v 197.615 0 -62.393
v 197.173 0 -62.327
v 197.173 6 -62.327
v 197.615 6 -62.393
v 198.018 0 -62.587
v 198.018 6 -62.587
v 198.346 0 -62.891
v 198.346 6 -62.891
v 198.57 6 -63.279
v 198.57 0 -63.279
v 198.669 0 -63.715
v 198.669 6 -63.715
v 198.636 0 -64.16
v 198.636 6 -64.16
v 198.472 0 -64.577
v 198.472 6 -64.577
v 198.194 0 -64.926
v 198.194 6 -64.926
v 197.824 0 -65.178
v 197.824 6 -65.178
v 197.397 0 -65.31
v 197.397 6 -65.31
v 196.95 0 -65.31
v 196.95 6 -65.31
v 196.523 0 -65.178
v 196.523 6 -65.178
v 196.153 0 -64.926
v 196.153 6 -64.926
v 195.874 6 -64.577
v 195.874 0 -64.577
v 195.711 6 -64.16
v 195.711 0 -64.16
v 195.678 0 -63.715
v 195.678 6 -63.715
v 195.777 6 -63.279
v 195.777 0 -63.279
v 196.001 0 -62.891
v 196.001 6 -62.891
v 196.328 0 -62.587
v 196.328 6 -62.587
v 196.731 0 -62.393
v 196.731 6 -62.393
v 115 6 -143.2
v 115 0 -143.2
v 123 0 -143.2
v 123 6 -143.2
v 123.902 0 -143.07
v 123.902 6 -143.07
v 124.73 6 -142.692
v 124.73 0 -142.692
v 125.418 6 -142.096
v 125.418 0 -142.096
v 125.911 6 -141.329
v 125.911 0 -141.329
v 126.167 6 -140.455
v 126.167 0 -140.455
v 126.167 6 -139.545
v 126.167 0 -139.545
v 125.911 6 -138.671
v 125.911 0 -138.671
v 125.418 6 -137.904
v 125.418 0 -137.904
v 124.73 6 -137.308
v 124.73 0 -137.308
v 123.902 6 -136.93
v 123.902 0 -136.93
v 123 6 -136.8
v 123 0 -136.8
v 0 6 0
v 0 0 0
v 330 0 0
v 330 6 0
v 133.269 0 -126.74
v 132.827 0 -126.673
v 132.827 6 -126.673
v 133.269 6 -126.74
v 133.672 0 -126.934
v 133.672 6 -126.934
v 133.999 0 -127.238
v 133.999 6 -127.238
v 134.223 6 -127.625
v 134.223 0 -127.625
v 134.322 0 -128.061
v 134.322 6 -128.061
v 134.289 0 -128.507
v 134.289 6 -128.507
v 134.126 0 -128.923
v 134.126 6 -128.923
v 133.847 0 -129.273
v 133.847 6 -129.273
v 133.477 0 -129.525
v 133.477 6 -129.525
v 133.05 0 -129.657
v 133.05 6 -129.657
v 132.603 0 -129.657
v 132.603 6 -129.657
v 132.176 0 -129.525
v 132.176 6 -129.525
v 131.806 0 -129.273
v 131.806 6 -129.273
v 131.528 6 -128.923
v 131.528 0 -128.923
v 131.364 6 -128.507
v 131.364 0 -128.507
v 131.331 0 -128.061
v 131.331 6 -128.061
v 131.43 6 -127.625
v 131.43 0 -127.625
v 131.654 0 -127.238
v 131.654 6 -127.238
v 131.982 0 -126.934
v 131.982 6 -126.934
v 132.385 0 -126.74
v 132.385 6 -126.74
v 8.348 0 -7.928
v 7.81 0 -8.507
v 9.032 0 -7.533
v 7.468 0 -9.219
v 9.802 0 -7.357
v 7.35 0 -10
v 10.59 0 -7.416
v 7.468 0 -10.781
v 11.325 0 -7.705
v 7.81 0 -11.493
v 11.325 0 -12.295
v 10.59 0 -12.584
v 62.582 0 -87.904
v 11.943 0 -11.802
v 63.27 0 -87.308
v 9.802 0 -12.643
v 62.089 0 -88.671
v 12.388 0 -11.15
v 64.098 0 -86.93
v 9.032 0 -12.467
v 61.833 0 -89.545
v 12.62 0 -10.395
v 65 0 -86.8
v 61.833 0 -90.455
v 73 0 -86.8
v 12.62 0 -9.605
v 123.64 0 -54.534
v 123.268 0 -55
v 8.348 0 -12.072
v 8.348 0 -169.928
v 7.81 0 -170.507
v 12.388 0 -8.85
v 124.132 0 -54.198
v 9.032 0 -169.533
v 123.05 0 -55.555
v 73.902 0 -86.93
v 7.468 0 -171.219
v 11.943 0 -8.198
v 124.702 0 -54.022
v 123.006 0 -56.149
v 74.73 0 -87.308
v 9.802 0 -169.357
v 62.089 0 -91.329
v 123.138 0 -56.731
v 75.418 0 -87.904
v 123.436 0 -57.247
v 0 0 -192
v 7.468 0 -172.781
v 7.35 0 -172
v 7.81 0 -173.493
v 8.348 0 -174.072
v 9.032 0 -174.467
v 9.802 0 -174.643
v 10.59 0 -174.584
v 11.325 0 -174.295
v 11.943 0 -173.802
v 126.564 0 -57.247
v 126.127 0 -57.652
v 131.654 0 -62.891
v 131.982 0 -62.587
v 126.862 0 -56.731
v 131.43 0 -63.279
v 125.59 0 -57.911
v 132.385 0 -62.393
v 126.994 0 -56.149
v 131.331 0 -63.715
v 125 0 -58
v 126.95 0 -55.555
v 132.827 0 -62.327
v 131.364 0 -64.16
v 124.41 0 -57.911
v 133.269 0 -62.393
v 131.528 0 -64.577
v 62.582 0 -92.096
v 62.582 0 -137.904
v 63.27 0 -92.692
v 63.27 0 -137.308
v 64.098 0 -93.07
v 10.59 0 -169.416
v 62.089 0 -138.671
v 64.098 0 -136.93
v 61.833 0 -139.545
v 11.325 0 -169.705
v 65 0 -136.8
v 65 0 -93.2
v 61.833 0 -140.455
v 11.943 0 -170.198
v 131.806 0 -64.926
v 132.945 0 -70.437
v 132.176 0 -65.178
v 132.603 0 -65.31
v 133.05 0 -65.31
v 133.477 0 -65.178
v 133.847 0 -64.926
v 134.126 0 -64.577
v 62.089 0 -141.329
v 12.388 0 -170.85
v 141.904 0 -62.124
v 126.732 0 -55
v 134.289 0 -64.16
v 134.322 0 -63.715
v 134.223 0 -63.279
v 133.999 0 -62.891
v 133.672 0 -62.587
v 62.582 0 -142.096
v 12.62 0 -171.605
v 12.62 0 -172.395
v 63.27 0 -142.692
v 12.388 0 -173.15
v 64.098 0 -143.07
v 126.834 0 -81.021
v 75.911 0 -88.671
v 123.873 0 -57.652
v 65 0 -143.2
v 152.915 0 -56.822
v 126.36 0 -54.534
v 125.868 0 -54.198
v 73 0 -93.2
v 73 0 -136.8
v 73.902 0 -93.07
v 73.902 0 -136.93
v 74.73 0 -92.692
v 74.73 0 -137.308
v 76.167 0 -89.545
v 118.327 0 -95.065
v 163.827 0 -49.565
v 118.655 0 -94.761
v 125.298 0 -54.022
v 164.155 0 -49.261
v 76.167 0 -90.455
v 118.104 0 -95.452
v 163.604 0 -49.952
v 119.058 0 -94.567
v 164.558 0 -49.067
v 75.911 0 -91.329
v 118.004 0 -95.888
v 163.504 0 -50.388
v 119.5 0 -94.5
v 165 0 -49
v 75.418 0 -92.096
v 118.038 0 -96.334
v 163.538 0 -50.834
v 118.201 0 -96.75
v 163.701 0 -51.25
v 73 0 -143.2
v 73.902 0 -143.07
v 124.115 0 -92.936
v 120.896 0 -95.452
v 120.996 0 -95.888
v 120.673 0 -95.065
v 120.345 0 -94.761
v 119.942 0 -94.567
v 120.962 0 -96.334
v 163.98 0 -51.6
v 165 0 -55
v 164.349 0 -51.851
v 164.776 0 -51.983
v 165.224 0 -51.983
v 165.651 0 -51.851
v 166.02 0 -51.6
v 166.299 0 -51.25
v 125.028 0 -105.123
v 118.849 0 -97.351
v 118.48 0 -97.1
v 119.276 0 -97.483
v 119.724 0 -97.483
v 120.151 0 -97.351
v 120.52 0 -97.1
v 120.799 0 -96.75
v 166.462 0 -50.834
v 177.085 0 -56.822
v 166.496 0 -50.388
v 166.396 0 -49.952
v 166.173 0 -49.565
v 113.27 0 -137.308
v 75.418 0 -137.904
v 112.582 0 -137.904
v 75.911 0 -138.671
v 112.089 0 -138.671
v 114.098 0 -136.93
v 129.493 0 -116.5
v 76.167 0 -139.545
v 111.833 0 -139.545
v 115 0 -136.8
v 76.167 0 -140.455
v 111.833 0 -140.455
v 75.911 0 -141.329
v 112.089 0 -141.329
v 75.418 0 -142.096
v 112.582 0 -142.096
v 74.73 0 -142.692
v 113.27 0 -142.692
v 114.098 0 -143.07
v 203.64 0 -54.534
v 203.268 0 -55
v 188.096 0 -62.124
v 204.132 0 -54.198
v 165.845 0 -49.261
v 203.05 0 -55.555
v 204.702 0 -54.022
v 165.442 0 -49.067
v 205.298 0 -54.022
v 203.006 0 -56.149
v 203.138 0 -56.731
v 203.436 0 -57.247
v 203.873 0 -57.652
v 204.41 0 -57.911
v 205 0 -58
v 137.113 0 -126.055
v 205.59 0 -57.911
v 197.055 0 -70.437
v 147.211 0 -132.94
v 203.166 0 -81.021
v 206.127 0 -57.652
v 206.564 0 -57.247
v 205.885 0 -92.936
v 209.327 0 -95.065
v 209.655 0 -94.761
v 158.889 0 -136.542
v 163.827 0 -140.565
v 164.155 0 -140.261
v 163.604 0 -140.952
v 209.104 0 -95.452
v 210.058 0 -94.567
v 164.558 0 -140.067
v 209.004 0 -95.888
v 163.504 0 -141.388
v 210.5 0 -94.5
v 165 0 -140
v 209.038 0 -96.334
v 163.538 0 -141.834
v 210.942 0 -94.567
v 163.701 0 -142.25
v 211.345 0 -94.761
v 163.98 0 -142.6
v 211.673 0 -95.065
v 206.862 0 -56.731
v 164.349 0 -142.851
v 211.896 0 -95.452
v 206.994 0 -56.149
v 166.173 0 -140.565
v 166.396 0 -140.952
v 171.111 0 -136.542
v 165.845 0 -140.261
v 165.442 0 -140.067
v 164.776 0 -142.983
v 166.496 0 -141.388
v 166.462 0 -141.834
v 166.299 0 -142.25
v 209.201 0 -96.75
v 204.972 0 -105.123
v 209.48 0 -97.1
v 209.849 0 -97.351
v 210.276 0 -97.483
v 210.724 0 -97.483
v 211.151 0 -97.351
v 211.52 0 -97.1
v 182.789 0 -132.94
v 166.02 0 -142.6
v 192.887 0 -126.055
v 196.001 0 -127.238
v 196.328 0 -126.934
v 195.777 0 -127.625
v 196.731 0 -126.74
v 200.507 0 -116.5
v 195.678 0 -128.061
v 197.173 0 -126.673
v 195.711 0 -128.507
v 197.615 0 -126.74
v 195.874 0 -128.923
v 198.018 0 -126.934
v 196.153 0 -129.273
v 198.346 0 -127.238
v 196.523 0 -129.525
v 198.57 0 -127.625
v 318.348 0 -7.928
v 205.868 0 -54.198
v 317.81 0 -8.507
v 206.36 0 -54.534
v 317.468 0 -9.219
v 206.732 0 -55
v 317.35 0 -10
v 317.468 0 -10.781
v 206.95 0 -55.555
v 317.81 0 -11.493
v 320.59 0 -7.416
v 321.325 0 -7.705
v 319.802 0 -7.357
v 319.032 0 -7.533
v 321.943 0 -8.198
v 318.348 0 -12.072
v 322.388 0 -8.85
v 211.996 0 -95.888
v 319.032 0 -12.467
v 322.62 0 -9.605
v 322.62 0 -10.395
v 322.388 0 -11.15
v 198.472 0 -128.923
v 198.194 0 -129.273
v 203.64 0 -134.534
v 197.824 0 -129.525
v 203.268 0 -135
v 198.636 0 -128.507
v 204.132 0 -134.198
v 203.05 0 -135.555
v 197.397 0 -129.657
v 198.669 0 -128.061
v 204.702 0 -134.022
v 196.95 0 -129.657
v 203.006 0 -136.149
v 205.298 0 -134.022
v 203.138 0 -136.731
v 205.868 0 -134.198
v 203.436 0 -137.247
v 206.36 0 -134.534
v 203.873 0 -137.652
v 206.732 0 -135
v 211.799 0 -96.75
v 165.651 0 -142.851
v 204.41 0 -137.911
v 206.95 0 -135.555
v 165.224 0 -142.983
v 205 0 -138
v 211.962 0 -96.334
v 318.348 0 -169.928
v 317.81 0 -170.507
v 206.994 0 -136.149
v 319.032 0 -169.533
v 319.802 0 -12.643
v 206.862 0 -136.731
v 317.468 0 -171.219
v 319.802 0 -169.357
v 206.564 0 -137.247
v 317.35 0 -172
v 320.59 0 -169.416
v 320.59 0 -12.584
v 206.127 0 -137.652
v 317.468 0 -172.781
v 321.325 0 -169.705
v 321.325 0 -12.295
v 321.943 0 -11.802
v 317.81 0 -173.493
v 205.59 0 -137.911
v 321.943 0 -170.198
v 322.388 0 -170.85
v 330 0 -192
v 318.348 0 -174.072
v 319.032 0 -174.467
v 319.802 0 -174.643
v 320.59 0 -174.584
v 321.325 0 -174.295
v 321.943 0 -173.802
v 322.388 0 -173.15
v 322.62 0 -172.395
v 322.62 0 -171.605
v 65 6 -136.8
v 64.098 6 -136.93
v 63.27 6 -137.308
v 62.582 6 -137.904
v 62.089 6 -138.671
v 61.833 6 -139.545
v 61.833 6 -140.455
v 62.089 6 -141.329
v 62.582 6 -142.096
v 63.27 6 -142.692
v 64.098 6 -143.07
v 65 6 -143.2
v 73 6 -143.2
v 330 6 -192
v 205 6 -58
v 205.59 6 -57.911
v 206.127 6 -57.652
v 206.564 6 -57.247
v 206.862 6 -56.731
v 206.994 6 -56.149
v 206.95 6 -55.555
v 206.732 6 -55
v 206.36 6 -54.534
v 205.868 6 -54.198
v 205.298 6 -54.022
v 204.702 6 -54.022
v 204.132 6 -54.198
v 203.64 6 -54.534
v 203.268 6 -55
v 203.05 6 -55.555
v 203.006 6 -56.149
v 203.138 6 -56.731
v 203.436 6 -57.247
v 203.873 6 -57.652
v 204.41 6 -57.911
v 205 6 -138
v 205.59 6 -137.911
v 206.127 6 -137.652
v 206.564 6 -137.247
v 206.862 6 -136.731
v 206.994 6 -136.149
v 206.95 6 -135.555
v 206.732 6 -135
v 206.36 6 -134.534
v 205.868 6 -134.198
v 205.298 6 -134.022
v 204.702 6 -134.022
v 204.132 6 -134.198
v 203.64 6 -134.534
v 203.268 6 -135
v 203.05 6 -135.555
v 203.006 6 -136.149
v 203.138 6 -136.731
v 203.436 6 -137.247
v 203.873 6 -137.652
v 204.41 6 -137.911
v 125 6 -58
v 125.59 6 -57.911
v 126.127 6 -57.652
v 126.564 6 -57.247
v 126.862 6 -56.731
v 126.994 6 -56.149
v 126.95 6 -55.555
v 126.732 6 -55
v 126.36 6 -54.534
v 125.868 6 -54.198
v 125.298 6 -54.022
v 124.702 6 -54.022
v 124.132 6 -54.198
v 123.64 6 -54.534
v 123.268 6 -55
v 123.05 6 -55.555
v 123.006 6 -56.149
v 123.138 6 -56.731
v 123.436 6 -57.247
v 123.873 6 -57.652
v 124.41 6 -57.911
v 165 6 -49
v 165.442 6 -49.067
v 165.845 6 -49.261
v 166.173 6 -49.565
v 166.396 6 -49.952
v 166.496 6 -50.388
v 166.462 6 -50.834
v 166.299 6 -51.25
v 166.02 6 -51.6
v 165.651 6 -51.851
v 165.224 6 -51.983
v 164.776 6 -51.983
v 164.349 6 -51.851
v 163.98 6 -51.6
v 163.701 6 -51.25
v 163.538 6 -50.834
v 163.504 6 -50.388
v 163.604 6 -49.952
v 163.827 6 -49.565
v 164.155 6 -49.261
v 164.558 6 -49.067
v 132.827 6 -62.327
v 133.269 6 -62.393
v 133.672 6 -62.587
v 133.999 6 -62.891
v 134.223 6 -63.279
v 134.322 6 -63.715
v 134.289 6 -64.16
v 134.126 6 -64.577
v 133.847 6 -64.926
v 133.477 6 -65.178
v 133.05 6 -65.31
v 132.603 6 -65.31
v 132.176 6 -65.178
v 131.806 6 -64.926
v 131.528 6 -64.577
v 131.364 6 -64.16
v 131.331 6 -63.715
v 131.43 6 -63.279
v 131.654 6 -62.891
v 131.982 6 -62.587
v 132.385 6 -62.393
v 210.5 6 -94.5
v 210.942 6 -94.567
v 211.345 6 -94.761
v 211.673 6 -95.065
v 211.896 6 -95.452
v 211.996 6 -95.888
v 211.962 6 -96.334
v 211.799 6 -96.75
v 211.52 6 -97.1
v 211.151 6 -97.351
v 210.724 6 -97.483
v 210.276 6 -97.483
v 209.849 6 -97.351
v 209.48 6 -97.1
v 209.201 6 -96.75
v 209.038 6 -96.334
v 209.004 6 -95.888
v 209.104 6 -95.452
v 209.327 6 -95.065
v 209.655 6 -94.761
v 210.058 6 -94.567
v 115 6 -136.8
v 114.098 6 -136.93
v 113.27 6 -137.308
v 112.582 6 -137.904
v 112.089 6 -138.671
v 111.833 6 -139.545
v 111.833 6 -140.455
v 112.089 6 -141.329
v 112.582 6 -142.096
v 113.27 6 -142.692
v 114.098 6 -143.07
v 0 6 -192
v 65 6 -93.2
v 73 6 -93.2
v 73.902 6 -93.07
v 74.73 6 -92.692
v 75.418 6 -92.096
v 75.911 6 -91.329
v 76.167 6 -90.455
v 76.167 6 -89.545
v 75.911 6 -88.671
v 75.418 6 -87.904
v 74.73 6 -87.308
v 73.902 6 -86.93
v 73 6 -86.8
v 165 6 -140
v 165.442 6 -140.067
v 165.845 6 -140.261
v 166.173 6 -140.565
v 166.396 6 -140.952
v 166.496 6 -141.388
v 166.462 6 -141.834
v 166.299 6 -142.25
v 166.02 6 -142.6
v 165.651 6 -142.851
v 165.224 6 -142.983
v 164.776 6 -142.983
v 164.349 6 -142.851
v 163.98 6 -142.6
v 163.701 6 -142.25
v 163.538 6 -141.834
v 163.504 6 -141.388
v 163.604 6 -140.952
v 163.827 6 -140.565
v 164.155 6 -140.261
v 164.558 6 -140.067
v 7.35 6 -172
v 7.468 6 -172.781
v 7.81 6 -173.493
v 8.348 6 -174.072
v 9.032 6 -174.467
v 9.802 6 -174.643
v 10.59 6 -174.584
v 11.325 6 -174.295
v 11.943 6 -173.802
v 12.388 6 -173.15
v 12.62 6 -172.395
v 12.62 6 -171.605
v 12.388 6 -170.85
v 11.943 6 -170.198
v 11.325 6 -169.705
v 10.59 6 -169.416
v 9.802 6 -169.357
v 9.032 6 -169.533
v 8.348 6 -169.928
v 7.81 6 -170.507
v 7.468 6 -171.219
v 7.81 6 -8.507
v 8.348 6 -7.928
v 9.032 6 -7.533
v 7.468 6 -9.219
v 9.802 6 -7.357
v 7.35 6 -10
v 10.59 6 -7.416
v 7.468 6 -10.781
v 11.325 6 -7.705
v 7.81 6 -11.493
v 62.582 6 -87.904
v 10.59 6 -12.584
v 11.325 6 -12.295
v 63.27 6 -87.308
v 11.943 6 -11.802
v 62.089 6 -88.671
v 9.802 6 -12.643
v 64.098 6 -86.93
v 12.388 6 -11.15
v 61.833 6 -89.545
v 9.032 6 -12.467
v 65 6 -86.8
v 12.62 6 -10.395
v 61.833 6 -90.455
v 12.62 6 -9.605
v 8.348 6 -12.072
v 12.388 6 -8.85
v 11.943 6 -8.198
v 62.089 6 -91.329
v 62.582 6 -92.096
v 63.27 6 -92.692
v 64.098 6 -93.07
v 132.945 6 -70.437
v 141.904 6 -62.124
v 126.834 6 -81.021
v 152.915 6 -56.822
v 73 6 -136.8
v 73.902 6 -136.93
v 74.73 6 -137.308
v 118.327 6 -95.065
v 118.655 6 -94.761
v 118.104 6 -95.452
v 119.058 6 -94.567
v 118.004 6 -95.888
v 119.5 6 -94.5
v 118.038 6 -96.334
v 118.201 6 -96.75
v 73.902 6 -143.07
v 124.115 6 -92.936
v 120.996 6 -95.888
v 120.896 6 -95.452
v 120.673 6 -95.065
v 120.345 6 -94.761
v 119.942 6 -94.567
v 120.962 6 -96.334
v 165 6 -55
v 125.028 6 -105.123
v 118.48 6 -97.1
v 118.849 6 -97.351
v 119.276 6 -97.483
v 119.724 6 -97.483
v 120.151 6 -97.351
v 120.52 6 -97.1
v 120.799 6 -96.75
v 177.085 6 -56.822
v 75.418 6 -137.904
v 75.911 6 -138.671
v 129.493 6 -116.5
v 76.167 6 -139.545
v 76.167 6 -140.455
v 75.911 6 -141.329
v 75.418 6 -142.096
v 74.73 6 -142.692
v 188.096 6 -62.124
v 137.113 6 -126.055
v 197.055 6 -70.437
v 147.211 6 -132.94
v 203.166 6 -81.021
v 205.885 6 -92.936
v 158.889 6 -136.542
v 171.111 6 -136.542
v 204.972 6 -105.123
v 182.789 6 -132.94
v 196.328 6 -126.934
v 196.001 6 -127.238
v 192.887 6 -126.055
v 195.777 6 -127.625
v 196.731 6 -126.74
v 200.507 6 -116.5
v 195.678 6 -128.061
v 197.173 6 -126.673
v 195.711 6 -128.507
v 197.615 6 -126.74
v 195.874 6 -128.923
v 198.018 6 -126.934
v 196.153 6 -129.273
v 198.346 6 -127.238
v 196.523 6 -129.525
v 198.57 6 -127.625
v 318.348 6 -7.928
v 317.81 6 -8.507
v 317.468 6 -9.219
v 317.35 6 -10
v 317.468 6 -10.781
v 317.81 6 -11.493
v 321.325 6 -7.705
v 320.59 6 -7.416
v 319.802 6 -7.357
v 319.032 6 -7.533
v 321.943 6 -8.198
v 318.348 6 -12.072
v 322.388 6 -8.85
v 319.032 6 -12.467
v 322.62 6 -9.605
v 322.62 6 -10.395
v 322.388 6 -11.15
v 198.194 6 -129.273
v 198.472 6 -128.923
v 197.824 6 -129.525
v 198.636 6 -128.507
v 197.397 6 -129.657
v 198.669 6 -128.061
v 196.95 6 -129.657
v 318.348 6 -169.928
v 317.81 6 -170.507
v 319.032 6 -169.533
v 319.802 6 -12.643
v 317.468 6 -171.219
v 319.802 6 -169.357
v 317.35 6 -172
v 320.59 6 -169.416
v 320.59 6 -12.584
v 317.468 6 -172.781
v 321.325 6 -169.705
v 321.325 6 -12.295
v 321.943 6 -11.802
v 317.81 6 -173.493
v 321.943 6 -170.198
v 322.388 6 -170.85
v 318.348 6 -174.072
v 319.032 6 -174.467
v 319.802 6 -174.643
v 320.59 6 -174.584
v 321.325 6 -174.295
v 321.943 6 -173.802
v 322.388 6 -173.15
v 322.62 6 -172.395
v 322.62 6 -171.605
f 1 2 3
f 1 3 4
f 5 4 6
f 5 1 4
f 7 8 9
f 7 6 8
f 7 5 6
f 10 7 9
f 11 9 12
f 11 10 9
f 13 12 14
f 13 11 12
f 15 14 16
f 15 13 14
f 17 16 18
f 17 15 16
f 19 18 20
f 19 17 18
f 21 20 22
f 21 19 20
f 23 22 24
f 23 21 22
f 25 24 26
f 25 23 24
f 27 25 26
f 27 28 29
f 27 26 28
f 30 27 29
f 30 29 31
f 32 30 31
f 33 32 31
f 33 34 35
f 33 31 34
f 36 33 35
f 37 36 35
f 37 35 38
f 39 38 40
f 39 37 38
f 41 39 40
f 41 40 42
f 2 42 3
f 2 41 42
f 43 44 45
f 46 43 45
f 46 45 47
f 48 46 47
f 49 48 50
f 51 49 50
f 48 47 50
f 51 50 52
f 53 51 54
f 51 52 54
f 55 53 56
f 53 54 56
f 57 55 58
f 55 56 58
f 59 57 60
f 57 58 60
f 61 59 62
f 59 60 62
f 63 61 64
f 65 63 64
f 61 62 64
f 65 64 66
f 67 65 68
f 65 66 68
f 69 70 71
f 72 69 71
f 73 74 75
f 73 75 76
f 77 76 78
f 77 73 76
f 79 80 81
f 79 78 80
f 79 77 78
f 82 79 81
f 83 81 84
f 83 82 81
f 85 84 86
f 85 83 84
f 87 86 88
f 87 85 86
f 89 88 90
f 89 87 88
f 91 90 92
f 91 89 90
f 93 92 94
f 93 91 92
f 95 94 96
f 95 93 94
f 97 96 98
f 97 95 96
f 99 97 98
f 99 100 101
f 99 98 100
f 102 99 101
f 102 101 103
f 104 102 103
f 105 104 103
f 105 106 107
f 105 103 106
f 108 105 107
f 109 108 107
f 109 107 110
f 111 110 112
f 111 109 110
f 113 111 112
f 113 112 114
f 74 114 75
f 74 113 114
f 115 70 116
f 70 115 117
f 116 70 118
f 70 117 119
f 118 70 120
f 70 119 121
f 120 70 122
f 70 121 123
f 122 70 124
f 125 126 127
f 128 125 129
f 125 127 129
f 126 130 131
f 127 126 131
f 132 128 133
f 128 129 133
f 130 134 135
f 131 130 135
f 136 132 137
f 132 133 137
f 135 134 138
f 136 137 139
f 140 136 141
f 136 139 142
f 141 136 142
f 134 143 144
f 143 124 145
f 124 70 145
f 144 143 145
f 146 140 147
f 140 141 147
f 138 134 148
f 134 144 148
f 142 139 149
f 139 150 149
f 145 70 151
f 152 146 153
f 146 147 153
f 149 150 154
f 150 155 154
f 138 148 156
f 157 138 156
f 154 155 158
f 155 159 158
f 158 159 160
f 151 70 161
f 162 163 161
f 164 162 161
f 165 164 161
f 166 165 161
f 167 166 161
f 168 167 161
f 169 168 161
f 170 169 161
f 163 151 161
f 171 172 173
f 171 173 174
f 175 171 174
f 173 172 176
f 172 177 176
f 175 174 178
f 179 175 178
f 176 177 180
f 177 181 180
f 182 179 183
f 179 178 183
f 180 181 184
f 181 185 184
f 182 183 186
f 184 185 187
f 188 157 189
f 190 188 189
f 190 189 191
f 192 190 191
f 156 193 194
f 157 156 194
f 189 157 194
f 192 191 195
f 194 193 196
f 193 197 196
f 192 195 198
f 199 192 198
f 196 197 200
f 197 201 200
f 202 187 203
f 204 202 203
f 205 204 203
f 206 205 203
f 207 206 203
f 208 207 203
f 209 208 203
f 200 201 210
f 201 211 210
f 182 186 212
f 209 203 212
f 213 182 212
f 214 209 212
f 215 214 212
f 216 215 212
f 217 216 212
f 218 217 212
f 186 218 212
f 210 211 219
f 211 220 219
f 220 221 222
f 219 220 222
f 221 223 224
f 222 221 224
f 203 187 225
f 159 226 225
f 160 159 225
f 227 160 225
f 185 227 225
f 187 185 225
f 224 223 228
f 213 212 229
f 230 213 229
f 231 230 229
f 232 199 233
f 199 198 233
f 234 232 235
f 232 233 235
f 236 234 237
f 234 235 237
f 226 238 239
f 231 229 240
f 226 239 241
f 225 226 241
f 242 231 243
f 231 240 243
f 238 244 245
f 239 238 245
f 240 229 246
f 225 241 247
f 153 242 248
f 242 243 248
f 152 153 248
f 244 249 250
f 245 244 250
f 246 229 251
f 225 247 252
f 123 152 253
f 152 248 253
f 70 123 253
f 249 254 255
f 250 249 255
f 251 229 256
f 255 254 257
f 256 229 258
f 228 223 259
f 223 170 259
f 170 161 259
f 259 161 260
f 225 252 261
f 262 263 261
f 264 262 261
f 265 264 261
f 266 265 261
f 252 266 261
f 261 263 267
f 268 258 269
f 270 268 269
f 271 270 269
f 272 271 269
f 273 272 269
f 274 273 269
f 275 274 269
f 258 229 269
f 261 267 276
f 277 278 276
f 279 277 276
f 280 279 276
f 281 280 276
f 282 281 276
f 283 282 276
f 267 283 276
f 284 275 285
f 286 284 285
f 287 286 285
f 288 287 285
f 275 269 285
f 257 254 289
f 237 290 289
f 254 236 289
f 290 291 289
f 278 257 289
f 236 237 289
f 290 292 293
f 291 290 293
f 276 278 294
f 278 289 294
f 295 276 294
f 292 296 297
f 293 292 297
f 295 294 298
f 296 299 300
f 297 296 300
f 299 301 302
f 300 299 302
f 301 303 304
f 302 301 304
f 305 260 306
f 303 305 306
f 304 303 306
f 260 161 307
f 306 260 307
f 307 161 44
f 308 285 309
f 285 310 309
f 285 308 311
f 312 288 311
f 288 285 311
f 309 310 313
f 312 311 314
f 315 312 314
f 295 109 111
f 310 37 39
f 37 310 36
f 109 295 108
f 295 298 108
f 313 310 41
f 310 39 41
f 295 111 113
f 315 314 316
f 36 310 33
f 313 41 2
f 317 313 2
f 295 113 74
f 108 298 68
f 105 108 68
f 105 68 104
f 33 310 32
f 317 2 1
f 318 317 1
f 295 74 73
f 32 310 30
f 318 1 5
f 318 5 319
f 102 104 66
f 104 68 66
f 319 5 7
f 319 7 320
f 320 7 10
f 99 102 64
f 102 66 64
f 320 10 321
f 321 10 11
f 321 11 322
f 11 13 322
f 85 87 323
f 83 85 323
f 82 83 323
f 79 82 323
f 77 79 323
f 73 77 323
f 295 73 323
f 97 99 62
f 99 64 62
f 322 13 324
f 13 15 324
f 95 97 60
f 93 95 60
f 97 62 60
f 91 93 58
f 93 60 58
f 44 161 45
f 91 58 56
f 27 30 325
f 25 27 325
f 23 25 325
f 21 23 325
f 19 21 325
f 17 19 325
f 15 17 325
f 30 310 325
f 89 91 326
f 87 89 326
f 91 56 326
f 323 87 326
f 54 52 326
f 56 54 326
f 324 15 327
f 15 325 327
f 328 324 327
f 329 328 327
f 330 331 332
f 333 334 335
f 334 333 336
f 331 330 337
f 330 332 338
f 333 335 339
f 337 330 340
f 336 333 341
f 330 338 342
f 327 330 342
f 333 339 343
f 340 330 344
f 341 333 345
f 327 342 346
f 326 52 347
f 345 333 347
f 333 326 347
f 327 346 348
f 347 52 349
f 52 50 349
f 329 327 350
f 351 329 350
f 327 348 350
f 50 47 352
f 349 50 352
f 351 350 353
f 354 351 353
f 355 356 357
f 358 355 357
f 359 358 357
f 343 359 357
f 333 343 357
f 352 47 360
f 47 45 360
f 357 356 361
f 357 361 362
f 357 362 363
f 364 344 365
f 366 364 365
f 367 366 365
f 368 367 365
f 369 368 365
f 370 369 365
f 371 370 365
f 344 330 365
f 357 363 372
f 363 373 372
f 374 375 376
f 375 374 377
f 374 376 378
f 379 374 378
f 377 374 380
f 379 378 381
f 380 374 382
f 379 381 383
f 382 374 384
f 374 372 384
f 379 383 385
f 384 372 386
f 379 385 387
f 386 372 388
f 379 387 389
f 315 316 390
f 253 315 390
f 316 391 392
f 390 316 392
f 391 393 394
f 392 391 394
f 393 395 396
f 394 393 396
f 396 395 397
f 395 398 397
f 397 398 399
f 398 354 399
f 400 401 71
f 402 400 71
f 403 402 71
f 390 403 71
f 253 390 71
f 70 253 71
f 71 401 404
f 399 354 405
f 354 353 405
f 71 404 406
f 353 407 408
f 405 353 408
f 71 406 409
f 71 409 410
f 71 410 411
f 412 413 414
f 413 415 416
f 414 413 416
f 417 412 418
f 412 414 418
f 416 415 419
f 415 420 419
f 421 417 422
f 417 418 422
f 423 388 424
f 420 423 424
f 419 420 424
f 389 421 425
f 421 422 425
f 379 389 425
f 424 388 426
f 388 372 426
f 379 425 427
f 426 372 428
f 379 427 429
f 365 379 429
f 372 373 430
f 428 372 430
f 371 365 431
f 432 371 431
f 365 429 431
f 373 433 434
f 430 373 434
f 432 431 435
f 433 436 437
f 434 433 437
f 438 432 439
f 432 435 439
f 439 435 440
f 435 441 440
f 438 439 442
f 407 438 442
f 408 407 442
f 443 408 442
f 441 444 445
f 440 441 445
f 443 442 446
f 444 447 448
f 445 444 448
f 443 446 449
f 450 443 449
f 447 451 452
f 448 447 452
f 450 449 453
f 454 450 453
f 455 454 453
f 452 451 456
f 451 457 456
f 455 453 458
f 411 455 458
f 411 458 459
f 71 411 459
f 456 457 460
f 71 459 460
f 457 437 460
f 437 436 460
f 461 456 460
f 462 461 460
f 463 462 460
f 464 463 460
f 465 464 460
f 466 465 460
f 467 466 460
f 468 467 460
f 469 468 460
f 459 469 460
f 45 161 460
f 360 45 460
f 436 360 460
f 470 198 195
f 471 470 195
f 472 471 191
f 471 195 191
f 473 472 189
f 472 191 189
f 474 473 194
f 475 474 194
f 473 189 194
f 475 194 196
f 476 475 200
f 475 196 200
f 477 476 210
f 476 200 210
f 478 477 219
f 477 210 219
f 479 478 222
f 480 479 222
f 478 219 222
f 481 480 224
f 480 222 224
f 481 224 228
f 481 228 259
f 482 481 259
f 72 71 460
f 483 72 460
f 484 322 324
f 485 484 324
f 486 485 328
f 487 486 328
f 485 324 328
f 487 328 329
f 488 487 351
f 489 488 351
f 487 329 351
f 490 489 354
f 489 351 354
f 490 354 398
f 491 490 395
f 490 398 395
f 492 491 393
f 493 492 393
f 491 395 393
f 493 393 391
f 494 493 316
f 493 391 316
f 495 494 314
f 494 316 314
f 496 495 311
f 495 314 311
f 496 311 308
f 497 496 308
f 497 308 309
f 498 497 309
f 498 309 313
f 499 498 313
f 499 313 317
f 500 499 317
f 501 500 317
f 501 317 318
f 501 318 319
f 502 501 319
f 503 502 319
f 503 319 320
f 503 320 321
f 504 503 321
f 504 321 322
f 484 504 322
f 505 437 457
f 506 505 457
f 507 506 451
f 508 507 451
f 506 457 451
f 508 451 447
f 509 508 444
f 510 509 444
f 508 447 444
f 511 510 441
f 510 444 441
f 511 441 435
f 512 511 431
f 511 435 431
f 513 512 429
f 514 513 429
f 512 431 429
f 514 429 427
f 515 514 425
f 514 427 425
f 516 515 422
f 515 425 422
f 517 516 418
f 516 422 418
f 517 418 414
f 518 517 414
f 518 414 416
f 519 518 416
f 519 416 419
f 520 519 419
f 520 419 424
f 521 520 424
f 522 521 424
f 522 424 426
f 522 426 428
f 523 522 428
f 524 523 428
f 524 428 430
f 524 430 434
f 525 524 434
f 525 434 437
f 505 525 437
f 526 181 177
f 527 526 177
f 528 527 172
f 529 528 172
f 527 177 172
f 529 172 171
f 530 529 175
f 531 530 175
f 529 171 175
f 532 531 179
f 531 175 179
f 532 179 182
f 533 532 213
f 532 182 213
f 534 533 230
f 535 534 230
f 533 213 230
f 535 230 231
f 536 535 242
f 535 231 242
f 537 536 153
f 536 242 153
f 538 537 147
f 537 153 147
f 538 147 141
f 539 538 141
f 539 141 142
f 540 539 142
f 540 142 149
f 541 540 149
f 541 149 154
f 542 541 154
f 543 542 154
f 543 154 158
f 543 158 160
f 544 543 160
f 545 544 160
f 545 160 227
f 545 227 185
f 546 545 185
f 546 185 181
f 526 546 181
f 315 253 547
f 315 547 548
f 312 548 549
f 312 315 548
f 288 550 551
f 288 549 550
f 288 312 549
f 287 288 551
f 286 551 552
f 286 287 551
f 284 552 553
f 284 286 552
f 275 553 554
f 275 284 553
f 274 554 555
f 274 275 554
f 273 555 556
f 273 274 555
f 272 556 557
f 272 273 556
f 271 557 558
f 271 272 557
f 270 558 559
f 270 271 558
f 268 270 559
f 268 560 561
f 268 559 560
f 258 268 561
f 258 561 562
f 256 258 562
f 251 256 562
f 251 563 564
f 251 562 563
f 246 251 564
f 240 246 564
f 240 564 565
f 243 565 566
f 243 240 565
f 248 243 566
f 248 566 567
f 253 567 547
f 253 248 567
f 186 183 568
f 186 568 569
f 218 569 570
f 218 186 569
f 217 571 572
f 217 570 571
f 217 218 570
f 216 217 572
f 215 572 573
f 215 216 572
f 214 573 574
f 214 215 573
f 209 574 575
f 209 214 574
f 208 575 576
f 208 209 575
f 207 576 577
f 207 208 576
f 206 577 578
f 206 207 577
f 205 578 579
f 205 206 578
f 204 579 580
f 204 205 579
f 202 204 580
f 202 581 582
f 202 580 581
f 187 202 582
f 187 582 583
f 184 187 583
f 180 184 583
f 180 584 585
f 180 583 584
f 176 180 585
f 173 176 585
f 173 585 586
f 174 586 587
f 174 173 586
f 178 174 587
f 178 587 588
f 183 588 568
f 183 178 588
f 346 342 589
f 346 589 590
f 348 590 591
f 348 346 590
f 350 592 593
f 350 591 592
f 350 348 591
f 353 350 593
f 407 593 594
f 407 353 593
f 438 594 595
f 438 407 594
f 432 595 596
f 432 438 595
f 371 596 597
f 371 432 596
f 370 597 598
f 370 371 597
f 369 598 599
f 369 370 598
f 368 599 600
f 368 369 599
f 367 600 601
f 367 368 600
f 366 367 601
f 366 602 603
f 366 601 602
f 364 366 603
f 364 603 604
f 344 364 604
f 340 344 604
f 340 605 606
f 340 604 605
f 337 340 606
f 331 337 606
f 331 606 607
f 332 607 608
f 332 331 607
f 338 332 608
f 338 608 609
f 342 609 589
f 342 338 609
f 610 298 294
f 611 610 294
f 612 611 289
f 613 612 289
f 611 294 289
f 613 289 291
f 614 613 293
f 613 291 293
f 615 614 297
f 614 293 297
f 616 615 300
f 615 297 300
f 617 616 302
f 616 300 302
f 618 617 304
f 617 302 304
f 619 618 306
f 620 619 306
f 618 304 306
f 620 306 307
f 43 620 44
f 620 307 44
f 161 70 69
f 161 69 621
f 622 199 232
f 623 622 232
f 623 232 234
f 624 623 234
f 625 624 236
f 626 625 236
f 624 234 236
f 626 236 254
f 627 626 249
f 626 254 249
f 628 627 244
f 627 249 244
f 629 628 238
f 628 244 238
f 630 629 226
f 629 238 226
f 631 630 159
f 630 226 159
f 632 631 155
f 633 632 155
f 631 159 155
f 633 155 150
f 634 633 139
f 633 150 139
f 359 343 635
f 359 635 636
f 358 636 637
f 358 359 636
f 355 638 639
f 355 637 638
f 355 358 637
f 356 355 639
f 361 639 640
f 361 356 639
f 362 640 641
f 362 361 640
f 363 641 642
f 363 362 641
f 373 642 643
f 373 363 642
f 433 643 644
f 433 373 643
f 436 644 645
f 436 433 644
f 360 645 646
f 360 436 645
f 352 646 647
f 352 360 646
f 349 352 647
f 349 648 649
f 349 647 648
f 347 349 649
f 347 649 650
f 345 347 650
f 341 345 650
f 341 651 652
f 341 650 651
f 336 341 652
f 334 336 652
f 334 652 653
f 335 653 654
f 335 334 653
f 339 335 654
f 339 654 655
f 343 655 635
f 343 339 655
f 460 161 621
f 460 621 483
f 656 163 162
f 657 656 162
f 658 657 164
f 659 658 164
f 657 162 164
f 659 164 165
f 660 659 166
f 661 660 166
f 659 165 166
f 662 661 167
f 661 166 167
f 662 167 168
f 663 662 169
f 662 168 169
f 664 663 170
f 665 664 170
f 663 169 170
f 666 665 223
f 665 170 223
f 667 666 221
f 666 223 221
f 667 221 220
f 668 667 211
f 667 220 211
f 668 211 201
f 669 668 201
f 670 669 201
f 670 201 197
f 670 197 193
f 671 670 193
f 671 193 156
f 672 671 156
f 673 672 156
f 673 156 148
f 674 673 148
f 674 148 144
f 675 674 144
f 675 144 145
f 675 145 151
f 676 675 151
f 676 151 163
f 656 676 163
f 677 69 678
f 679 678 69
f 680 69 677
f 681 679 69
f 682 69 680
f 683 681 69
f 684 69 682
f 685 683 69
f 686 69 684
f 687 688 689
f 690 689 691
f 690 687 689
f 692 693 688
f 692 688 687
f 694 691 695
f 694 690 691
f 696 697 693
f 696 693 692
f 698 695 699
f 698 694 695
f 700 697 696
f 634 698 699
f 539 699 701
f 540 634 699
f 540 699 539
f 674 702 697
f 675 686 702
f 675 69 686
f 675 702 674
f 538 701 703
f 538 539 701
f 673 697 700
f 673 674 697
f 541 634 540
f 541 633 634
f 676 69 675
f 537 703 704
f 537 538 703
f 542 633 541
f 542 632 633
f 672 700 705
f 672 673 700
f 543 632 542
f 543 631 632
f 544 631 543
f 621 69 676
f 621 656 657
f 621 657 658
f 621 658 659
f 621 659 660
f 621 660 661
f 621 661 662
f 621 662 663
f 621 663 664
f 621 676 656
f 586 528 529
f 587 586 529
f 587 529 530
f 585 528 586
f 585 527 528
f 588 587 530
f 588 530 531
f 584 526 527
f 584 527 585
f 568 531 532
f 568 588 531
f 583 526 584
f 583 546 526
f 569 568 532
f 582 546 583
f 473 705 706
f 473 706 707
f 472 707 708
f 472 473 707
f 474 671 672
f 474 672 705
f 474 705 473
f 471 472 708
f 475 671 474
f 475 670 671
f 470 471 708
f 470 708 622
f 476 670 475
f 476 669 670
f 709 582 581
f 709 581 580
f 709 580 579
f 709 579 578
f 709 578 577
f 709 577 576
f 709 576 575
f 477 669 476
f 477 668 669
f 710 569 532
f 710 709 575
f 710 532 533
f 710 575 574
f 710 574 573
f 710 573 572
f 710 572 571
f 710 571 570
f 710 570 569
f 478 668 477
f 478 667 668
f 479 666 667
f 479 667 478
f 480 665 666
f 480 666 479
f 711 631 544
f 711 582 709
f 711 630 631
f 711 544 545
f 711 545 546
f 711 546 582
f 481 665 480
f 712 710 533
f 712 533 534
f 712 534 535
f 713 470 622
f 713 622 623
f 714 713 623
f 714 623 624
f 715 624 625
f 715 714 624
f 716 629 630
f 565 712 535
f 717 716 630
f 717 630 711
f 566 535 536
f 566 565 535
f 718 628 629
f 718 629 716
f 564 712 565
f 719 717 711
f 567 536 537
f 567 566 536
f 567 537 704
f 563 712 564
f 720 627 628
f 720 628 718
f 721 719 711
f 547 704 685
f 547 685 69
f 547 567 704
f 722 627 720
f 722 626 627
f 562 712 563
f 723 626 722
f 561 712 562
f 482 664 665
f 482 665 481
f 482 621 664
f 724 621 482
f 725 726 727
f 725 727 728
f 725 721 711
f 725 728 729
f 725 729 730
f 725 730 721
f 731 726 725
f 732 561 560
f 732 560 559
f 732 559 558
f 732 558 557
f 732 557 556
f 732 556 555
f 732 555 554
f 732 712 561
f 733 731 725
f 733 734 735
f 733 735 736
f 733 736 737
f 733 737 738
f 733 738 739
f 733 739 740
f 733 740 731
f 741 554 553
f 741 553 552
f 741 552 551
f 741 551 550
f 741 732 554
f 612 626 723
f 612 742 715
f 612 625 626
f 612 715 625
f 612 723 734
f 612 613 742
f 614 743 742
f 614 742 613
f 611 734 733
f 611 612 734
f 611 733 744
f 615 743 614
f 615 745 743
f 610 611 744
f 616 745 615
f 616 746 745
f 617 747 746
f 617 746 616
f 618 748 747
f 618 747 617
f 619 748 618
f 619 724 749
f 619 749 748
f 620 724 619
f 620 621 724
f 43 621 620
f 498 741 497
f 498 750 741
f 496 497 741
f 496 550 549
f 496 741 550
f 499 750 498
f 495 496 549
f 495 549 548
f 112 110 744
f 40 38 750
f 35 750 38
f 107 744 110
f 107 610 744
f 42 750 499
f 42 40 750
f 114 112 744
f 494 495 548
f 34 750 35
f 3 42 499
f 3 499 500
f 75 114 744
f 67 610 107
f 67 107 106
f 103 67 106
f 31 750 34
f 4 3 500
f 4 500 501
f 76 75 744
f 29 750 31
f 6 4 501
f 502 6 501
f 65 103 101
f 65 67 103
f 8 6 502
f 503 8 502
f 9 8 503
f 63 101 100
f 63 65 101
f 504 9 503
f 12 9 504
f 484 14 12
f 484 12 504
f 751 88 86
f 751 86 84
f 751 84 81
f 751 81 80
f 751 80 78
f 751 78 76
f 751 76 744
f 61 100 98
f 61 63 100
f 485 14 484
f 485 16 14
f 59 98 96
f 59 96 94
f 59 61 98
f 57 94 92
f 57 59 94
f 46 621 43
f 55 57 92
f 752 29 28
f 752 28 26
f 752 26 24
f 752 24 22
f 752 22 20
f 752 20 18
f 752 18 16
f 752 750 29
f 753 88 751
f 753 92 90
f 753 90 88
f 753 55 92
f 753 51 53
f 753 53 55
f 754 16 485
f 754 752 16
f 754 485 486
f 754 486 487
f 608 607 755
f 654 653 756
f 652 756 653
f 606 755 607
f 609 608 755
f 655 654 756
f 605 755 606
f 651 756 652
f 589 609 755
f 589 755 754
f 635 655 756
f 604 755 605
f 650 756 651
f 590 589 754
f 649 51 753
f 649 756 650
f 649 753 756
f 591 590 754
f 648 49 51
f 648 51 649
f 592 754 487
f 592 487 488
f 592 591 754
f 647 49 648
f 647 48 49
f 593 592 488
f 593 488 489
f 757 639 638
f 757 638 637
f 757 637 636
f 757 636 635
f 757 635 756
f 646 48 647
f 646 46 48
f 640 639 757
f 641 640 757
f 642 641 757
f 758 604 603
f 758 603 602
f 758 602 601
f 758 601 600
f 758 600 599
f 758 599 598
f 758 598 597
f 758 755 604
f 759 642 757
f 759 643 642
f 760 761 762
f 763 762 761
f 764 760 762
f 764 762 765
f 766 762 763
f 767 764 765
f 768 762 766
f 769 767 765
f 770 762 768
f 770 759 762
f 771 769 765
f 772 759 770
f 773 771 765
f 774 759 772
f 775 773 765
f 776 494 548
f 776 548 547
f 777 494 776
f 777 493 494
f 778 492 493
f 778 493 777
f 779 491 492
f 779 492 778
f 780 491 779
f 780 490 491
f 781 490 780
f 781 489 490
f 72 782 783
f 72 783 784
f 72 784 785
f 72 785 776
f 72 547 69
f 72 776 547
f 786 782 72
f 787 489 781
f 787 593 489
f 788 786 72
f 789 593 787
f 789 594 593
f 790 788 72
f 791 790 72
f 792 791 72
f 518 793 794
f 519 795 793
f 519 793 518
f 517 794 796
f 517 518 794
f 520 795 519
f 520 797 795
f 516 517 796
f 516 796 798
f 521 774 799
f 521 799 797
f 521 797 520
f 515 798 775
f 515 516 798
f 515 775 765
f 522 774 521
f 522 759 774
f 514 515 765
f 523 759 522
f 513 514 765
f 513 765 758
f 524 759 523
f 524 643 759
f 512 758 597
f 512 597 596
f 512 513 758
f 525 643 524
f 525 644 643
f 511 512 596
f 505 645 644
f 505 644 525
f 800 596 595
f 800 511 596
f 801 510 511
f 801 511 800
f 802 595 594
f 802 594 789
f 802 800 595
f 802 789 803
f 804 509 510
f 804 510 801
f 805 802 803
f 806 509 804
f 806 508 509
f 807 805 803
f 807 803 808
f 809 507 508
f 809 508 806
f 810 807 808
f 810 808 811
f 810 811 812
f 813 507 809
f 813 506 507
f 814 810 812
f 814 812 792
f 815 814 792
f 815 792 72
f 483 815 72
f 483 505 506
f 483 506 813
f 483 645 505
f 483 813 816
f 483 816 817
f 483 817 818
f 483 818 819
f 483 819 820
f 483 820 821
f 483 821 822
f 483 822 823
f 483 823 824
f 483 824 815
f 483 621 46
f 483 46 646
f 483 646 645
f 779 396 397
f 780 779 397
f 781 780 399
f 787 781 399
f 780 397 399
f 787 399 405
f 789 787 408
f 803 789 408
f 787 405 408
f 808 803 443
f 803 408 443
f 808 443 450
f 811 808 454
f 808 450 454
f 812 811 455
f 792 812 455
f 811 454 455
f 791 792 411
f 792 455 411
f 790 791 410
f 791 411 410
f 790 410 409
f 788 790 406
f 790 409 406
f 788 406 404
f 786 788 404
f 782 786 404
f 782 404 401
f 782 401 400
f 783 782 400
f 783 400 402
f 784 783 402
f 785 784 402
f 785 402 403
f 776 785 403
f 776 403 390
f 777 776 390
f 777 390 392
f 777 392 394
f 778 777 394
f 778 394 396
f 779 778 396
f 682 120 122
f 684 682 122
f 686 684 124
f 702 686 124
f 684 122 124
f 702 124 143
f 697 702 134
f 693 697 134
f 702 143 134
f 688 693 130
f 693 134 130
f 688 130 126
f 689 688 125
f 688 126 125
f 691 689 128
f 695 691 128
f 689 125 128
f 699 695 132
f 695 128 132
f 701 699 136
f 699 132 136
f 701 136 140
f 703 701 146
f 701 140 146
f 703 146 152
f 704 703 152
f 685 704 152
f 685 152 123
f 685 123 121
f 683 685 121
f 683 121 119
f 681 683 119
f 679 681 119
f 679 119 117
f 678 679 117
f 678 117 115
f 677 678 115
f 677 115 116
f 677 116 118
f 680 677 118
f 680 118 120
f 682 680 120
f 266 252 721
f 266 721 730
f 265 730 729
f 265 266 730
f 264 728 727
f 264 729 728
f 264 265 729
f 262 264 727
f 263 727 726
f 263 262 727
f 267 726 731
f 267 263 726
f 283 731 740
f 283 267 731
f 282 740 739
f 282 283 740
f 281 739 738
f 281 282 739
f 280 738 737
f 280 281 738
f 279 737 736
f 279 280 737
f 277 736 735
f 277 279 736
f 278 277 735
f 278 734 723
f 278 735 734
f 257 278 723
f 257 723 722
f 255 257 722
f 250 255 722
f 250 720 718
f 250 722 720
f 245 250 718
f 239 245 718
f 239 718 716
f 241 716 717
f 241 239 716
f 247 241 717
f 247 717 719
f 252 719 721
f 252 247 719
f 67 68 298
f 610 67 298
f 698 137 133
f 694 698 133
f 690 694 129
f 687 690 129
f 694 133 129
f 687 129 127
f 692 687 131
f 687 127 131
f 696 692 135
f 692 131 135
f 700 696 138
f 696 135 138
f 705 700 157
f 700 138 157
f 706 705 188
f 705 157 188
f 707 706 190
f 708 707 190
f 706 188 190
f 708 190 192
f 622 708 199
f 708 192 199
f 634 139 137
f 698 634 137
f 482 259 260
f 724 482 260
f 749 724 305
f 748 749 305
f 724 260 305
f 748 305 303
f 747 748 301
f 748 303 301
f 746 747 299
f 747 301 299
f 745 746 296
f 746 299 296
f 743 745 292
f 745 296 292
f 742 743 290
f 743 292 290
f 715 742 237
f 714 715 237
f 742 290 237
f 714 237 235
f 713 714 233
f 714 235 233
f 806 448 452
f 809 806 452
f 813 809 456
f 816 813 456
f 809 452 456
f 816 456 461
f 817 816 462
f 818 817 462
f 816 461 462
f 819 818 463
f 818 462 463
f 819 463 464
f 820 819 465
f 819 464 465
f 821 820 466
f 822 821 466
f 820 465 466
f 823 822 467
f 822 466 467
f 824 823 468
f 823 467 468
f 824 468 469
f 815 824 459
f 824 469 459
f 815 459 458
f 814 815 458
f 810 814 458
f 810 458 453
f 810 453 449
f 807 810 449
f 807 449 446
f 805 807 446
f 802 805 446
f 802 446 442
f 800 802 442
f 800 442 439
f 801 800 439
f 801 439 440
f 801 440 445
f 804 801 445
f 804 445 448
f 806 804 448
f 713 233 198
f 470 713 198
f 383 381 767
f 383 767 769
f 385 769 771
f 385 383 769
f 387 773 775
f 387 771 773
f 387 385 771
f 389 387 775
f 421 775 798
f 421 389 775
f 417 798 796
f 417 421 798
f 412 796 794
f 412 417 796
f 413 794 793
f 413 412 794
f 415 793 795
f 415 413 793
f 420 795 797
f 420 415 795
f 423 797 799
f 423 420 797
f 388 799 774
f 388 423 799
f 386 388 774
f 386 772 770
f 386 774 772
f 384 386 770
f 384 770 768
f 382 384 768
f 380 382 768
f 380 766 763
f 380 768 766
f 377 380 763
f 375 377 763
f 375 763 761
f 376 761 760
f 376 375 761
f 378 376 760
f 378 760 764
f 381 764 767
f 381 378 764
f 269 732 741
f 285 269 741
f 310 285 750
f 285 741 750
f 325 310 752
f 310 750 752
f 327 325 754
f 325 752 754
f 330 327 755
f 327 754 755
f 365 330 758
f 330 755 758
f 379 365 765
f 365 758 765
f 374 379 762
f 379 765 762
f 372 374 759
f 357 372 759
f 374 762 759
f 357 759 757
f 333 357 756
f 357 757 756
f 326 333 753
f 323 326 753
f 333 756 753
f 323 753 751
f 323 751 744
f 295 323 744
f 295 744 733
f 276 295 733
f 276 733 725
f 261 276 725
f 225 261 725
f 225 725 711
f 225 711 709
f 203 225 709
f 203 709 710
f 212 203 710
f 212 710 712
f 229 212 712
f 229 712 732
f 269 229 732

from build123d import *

# Parameters (mm, degrees)
SKETCH1_W                = 330
SKETCH1_H                = 192
BOSS_EXTRUDE1_DEPTH      = 6
CUT_EXTRUDE1_DEPTH       = 382.837661841
CUT_EXTRUDE1_DEPTH_BACK  = 382.837661841
SKETCH2_R                = 1.5
SKETCH3_R                = 41
CUT_EXTRUDE2_DEPTH       = 382.837661841
CUT_EXTRUDE5_DEPTH       = 10
SKETCH11_R               = 2
CUT_EXTRUDE6_DEPTH       = 10
M5_CLEARANCE_HOLE1_D     = 5.3
M5_CLEARANCE_HOLE1_DEPTH = 11.94
M5_CLEARANCE_HOLE1_TIP   = 1.59228064


with BuildPart() as part:
    # Sketch1 → Boss-Extrude1 (new body)
    with BuildSketch(Plane(origin=(0, 0, 0), x_dir=(1, 0, 0), z_dir=(0, 1, 0))):
        with Locations((165, 96)):
            Rectangle(SKETCH1_W, SKETCH1_H)
    extrude(amount=BOSS_EXTRUDE1_DEPTH)

    # Sketch2 → Cut-Extrude1 (cut, two sides: drawn at the far end of the back side and taken through both)
    with BuildSketch(Plane(origin=(0, 6, 0), x_dir=(1, 0, 0), z_dir=(0, 1, 0)).offset(-CUT_EXTRUDE1_DEPTH_BACK)):
        with Locations(Location((165, 141.5, 0), (0, 0, 270))):
            Circle(SKETCH2_R)
        with Locations(Location((197.173358544, 128.173358544, 0), (0, 0, 270))):
            Circle(SKETCH2_R)
        with Locations(Location((210.5, 96, 0), (0, 0, 270))):
            Circle(SKETCH2_R)
        with Locations(Location((165, 50.5, 0), (0, 0, 270))):
            Circle(SKETCH2_R)
        with Locations(Location((132.826641456, 63.826641456, 0), (0, 0, 270))):
            Circle(SKETCH2_R)
        with Locations(Location((119.5, 96, 0), (0, 0, 270))):
            Circle(SKETCH2_R)
        with Locations(Location((132.826641456, 128.173358544, 0), (0, 0, 270))):
            Circle(SKETCH2_R)
        with Locations(Location((197.173358544, 63.826641456, 0), (0, 0, 270))):
            Circle(SKETCH2_R)
    extrude(amount=CUT_EXTRUDE1_DEPTH + CUT_EXTRUDE1_DEPTH_BACK, mode=Mode.SUBTRACT)

    # Sketch3 → Cut-Extrude2 (cut, through all)
    with BuildSketch(Plane(origin=(0, 6, 0), x_dir=(1, 0, 0), z_dir=(0, 1, 0))):
        with Locations(Location((165, 96, 0), (0, 0, 270))):
            Circle(SKETCH3_R)
    extrude(amount=-CUT_EXTRUDE2_DEPTH, mode=Mode.SUBTRACT)

    # Sketch10 → Cut-Extrude5 (cut)
    with BuildSketch(Plane.XZ):
        with BuildLine():
            Line((123, -136.8), (115, -136.8))
            ThreePointArc((115, -136.8), (111.8, -140), (115, -143.2))
            Line((115, -143.2), (123, -143.2))
            ThreePointArc((123, -143.2), (126.2, -140), (123, -136.8))
        make_face()
        with BuildLine():
            Line((73, -136.8), (65, -136.8))
            ThreePointArc((65, -136.8), (61.8, -140), (65, -143.2))
            Line((65, -143.2), (73, -143.2))
            ThreePointArc((73, -143.2), (76.2, -140), (73, -136.8))
        make_face()
        with BuildLine():
            Line((73, -86.8), (65, -86.8))
            ThreePointArc((65, -86.8), (61.8, -90), (65, -93.2))
            Line((65, -93.2), (73, -93.2))
            ThreePointArc((73, -93.2), (76.2, -90), (73, -86.8))
        make_face()
    extrude(amount=-CUT_EXTRUDE5_DEPTH, mode=Mode.SUBTRACT)

    # Sketch11 → Cut-Extrude6 (cut)
    with BuildSketch(Plane.XZ):
        with Locations(Location((125, -56, 0), (0, 0, 270))):
            Circle(SKETCH11_R)
        with Locations(Location((205, -56, 0), (0, 0, 270))):
            Circle(SKETCH11_R)
        with Locations(Location((205, -136, 0), (0, 0, 270))):
            Circle(SKETCH11_R)
    extrude(amount=-CUT_EXTRUDE6_DEPTH, mode=Mode.SUBTRACT)

    # M5 Clearance Hole1
    with Locations(Plane(origin=(0, 6, 0), x_dir=(1, 0, 0), z_dir=(0, 1, 0))):
        with Locations((10, 172), (10, 10), (320, 10), (320, 172)):
            Hole(M5_CLEARANCE_HOLE1_D / 2, depth=M5_CLEARANCE_HOLE1_DEPTH)
            with Locations((0, 0, -(M5_CLEARANCE_HOLE1_DEPTH + M5_CLEARANCE_HOLE1_TIP / 2))):  # 118° drill point
                Cone(0, M5_CLEARANCE_HOLE1_D / 2, M5_CLEARANCE_HOLE1_TIP, mode=Mode.SUBTRACT)


solid = part.part
